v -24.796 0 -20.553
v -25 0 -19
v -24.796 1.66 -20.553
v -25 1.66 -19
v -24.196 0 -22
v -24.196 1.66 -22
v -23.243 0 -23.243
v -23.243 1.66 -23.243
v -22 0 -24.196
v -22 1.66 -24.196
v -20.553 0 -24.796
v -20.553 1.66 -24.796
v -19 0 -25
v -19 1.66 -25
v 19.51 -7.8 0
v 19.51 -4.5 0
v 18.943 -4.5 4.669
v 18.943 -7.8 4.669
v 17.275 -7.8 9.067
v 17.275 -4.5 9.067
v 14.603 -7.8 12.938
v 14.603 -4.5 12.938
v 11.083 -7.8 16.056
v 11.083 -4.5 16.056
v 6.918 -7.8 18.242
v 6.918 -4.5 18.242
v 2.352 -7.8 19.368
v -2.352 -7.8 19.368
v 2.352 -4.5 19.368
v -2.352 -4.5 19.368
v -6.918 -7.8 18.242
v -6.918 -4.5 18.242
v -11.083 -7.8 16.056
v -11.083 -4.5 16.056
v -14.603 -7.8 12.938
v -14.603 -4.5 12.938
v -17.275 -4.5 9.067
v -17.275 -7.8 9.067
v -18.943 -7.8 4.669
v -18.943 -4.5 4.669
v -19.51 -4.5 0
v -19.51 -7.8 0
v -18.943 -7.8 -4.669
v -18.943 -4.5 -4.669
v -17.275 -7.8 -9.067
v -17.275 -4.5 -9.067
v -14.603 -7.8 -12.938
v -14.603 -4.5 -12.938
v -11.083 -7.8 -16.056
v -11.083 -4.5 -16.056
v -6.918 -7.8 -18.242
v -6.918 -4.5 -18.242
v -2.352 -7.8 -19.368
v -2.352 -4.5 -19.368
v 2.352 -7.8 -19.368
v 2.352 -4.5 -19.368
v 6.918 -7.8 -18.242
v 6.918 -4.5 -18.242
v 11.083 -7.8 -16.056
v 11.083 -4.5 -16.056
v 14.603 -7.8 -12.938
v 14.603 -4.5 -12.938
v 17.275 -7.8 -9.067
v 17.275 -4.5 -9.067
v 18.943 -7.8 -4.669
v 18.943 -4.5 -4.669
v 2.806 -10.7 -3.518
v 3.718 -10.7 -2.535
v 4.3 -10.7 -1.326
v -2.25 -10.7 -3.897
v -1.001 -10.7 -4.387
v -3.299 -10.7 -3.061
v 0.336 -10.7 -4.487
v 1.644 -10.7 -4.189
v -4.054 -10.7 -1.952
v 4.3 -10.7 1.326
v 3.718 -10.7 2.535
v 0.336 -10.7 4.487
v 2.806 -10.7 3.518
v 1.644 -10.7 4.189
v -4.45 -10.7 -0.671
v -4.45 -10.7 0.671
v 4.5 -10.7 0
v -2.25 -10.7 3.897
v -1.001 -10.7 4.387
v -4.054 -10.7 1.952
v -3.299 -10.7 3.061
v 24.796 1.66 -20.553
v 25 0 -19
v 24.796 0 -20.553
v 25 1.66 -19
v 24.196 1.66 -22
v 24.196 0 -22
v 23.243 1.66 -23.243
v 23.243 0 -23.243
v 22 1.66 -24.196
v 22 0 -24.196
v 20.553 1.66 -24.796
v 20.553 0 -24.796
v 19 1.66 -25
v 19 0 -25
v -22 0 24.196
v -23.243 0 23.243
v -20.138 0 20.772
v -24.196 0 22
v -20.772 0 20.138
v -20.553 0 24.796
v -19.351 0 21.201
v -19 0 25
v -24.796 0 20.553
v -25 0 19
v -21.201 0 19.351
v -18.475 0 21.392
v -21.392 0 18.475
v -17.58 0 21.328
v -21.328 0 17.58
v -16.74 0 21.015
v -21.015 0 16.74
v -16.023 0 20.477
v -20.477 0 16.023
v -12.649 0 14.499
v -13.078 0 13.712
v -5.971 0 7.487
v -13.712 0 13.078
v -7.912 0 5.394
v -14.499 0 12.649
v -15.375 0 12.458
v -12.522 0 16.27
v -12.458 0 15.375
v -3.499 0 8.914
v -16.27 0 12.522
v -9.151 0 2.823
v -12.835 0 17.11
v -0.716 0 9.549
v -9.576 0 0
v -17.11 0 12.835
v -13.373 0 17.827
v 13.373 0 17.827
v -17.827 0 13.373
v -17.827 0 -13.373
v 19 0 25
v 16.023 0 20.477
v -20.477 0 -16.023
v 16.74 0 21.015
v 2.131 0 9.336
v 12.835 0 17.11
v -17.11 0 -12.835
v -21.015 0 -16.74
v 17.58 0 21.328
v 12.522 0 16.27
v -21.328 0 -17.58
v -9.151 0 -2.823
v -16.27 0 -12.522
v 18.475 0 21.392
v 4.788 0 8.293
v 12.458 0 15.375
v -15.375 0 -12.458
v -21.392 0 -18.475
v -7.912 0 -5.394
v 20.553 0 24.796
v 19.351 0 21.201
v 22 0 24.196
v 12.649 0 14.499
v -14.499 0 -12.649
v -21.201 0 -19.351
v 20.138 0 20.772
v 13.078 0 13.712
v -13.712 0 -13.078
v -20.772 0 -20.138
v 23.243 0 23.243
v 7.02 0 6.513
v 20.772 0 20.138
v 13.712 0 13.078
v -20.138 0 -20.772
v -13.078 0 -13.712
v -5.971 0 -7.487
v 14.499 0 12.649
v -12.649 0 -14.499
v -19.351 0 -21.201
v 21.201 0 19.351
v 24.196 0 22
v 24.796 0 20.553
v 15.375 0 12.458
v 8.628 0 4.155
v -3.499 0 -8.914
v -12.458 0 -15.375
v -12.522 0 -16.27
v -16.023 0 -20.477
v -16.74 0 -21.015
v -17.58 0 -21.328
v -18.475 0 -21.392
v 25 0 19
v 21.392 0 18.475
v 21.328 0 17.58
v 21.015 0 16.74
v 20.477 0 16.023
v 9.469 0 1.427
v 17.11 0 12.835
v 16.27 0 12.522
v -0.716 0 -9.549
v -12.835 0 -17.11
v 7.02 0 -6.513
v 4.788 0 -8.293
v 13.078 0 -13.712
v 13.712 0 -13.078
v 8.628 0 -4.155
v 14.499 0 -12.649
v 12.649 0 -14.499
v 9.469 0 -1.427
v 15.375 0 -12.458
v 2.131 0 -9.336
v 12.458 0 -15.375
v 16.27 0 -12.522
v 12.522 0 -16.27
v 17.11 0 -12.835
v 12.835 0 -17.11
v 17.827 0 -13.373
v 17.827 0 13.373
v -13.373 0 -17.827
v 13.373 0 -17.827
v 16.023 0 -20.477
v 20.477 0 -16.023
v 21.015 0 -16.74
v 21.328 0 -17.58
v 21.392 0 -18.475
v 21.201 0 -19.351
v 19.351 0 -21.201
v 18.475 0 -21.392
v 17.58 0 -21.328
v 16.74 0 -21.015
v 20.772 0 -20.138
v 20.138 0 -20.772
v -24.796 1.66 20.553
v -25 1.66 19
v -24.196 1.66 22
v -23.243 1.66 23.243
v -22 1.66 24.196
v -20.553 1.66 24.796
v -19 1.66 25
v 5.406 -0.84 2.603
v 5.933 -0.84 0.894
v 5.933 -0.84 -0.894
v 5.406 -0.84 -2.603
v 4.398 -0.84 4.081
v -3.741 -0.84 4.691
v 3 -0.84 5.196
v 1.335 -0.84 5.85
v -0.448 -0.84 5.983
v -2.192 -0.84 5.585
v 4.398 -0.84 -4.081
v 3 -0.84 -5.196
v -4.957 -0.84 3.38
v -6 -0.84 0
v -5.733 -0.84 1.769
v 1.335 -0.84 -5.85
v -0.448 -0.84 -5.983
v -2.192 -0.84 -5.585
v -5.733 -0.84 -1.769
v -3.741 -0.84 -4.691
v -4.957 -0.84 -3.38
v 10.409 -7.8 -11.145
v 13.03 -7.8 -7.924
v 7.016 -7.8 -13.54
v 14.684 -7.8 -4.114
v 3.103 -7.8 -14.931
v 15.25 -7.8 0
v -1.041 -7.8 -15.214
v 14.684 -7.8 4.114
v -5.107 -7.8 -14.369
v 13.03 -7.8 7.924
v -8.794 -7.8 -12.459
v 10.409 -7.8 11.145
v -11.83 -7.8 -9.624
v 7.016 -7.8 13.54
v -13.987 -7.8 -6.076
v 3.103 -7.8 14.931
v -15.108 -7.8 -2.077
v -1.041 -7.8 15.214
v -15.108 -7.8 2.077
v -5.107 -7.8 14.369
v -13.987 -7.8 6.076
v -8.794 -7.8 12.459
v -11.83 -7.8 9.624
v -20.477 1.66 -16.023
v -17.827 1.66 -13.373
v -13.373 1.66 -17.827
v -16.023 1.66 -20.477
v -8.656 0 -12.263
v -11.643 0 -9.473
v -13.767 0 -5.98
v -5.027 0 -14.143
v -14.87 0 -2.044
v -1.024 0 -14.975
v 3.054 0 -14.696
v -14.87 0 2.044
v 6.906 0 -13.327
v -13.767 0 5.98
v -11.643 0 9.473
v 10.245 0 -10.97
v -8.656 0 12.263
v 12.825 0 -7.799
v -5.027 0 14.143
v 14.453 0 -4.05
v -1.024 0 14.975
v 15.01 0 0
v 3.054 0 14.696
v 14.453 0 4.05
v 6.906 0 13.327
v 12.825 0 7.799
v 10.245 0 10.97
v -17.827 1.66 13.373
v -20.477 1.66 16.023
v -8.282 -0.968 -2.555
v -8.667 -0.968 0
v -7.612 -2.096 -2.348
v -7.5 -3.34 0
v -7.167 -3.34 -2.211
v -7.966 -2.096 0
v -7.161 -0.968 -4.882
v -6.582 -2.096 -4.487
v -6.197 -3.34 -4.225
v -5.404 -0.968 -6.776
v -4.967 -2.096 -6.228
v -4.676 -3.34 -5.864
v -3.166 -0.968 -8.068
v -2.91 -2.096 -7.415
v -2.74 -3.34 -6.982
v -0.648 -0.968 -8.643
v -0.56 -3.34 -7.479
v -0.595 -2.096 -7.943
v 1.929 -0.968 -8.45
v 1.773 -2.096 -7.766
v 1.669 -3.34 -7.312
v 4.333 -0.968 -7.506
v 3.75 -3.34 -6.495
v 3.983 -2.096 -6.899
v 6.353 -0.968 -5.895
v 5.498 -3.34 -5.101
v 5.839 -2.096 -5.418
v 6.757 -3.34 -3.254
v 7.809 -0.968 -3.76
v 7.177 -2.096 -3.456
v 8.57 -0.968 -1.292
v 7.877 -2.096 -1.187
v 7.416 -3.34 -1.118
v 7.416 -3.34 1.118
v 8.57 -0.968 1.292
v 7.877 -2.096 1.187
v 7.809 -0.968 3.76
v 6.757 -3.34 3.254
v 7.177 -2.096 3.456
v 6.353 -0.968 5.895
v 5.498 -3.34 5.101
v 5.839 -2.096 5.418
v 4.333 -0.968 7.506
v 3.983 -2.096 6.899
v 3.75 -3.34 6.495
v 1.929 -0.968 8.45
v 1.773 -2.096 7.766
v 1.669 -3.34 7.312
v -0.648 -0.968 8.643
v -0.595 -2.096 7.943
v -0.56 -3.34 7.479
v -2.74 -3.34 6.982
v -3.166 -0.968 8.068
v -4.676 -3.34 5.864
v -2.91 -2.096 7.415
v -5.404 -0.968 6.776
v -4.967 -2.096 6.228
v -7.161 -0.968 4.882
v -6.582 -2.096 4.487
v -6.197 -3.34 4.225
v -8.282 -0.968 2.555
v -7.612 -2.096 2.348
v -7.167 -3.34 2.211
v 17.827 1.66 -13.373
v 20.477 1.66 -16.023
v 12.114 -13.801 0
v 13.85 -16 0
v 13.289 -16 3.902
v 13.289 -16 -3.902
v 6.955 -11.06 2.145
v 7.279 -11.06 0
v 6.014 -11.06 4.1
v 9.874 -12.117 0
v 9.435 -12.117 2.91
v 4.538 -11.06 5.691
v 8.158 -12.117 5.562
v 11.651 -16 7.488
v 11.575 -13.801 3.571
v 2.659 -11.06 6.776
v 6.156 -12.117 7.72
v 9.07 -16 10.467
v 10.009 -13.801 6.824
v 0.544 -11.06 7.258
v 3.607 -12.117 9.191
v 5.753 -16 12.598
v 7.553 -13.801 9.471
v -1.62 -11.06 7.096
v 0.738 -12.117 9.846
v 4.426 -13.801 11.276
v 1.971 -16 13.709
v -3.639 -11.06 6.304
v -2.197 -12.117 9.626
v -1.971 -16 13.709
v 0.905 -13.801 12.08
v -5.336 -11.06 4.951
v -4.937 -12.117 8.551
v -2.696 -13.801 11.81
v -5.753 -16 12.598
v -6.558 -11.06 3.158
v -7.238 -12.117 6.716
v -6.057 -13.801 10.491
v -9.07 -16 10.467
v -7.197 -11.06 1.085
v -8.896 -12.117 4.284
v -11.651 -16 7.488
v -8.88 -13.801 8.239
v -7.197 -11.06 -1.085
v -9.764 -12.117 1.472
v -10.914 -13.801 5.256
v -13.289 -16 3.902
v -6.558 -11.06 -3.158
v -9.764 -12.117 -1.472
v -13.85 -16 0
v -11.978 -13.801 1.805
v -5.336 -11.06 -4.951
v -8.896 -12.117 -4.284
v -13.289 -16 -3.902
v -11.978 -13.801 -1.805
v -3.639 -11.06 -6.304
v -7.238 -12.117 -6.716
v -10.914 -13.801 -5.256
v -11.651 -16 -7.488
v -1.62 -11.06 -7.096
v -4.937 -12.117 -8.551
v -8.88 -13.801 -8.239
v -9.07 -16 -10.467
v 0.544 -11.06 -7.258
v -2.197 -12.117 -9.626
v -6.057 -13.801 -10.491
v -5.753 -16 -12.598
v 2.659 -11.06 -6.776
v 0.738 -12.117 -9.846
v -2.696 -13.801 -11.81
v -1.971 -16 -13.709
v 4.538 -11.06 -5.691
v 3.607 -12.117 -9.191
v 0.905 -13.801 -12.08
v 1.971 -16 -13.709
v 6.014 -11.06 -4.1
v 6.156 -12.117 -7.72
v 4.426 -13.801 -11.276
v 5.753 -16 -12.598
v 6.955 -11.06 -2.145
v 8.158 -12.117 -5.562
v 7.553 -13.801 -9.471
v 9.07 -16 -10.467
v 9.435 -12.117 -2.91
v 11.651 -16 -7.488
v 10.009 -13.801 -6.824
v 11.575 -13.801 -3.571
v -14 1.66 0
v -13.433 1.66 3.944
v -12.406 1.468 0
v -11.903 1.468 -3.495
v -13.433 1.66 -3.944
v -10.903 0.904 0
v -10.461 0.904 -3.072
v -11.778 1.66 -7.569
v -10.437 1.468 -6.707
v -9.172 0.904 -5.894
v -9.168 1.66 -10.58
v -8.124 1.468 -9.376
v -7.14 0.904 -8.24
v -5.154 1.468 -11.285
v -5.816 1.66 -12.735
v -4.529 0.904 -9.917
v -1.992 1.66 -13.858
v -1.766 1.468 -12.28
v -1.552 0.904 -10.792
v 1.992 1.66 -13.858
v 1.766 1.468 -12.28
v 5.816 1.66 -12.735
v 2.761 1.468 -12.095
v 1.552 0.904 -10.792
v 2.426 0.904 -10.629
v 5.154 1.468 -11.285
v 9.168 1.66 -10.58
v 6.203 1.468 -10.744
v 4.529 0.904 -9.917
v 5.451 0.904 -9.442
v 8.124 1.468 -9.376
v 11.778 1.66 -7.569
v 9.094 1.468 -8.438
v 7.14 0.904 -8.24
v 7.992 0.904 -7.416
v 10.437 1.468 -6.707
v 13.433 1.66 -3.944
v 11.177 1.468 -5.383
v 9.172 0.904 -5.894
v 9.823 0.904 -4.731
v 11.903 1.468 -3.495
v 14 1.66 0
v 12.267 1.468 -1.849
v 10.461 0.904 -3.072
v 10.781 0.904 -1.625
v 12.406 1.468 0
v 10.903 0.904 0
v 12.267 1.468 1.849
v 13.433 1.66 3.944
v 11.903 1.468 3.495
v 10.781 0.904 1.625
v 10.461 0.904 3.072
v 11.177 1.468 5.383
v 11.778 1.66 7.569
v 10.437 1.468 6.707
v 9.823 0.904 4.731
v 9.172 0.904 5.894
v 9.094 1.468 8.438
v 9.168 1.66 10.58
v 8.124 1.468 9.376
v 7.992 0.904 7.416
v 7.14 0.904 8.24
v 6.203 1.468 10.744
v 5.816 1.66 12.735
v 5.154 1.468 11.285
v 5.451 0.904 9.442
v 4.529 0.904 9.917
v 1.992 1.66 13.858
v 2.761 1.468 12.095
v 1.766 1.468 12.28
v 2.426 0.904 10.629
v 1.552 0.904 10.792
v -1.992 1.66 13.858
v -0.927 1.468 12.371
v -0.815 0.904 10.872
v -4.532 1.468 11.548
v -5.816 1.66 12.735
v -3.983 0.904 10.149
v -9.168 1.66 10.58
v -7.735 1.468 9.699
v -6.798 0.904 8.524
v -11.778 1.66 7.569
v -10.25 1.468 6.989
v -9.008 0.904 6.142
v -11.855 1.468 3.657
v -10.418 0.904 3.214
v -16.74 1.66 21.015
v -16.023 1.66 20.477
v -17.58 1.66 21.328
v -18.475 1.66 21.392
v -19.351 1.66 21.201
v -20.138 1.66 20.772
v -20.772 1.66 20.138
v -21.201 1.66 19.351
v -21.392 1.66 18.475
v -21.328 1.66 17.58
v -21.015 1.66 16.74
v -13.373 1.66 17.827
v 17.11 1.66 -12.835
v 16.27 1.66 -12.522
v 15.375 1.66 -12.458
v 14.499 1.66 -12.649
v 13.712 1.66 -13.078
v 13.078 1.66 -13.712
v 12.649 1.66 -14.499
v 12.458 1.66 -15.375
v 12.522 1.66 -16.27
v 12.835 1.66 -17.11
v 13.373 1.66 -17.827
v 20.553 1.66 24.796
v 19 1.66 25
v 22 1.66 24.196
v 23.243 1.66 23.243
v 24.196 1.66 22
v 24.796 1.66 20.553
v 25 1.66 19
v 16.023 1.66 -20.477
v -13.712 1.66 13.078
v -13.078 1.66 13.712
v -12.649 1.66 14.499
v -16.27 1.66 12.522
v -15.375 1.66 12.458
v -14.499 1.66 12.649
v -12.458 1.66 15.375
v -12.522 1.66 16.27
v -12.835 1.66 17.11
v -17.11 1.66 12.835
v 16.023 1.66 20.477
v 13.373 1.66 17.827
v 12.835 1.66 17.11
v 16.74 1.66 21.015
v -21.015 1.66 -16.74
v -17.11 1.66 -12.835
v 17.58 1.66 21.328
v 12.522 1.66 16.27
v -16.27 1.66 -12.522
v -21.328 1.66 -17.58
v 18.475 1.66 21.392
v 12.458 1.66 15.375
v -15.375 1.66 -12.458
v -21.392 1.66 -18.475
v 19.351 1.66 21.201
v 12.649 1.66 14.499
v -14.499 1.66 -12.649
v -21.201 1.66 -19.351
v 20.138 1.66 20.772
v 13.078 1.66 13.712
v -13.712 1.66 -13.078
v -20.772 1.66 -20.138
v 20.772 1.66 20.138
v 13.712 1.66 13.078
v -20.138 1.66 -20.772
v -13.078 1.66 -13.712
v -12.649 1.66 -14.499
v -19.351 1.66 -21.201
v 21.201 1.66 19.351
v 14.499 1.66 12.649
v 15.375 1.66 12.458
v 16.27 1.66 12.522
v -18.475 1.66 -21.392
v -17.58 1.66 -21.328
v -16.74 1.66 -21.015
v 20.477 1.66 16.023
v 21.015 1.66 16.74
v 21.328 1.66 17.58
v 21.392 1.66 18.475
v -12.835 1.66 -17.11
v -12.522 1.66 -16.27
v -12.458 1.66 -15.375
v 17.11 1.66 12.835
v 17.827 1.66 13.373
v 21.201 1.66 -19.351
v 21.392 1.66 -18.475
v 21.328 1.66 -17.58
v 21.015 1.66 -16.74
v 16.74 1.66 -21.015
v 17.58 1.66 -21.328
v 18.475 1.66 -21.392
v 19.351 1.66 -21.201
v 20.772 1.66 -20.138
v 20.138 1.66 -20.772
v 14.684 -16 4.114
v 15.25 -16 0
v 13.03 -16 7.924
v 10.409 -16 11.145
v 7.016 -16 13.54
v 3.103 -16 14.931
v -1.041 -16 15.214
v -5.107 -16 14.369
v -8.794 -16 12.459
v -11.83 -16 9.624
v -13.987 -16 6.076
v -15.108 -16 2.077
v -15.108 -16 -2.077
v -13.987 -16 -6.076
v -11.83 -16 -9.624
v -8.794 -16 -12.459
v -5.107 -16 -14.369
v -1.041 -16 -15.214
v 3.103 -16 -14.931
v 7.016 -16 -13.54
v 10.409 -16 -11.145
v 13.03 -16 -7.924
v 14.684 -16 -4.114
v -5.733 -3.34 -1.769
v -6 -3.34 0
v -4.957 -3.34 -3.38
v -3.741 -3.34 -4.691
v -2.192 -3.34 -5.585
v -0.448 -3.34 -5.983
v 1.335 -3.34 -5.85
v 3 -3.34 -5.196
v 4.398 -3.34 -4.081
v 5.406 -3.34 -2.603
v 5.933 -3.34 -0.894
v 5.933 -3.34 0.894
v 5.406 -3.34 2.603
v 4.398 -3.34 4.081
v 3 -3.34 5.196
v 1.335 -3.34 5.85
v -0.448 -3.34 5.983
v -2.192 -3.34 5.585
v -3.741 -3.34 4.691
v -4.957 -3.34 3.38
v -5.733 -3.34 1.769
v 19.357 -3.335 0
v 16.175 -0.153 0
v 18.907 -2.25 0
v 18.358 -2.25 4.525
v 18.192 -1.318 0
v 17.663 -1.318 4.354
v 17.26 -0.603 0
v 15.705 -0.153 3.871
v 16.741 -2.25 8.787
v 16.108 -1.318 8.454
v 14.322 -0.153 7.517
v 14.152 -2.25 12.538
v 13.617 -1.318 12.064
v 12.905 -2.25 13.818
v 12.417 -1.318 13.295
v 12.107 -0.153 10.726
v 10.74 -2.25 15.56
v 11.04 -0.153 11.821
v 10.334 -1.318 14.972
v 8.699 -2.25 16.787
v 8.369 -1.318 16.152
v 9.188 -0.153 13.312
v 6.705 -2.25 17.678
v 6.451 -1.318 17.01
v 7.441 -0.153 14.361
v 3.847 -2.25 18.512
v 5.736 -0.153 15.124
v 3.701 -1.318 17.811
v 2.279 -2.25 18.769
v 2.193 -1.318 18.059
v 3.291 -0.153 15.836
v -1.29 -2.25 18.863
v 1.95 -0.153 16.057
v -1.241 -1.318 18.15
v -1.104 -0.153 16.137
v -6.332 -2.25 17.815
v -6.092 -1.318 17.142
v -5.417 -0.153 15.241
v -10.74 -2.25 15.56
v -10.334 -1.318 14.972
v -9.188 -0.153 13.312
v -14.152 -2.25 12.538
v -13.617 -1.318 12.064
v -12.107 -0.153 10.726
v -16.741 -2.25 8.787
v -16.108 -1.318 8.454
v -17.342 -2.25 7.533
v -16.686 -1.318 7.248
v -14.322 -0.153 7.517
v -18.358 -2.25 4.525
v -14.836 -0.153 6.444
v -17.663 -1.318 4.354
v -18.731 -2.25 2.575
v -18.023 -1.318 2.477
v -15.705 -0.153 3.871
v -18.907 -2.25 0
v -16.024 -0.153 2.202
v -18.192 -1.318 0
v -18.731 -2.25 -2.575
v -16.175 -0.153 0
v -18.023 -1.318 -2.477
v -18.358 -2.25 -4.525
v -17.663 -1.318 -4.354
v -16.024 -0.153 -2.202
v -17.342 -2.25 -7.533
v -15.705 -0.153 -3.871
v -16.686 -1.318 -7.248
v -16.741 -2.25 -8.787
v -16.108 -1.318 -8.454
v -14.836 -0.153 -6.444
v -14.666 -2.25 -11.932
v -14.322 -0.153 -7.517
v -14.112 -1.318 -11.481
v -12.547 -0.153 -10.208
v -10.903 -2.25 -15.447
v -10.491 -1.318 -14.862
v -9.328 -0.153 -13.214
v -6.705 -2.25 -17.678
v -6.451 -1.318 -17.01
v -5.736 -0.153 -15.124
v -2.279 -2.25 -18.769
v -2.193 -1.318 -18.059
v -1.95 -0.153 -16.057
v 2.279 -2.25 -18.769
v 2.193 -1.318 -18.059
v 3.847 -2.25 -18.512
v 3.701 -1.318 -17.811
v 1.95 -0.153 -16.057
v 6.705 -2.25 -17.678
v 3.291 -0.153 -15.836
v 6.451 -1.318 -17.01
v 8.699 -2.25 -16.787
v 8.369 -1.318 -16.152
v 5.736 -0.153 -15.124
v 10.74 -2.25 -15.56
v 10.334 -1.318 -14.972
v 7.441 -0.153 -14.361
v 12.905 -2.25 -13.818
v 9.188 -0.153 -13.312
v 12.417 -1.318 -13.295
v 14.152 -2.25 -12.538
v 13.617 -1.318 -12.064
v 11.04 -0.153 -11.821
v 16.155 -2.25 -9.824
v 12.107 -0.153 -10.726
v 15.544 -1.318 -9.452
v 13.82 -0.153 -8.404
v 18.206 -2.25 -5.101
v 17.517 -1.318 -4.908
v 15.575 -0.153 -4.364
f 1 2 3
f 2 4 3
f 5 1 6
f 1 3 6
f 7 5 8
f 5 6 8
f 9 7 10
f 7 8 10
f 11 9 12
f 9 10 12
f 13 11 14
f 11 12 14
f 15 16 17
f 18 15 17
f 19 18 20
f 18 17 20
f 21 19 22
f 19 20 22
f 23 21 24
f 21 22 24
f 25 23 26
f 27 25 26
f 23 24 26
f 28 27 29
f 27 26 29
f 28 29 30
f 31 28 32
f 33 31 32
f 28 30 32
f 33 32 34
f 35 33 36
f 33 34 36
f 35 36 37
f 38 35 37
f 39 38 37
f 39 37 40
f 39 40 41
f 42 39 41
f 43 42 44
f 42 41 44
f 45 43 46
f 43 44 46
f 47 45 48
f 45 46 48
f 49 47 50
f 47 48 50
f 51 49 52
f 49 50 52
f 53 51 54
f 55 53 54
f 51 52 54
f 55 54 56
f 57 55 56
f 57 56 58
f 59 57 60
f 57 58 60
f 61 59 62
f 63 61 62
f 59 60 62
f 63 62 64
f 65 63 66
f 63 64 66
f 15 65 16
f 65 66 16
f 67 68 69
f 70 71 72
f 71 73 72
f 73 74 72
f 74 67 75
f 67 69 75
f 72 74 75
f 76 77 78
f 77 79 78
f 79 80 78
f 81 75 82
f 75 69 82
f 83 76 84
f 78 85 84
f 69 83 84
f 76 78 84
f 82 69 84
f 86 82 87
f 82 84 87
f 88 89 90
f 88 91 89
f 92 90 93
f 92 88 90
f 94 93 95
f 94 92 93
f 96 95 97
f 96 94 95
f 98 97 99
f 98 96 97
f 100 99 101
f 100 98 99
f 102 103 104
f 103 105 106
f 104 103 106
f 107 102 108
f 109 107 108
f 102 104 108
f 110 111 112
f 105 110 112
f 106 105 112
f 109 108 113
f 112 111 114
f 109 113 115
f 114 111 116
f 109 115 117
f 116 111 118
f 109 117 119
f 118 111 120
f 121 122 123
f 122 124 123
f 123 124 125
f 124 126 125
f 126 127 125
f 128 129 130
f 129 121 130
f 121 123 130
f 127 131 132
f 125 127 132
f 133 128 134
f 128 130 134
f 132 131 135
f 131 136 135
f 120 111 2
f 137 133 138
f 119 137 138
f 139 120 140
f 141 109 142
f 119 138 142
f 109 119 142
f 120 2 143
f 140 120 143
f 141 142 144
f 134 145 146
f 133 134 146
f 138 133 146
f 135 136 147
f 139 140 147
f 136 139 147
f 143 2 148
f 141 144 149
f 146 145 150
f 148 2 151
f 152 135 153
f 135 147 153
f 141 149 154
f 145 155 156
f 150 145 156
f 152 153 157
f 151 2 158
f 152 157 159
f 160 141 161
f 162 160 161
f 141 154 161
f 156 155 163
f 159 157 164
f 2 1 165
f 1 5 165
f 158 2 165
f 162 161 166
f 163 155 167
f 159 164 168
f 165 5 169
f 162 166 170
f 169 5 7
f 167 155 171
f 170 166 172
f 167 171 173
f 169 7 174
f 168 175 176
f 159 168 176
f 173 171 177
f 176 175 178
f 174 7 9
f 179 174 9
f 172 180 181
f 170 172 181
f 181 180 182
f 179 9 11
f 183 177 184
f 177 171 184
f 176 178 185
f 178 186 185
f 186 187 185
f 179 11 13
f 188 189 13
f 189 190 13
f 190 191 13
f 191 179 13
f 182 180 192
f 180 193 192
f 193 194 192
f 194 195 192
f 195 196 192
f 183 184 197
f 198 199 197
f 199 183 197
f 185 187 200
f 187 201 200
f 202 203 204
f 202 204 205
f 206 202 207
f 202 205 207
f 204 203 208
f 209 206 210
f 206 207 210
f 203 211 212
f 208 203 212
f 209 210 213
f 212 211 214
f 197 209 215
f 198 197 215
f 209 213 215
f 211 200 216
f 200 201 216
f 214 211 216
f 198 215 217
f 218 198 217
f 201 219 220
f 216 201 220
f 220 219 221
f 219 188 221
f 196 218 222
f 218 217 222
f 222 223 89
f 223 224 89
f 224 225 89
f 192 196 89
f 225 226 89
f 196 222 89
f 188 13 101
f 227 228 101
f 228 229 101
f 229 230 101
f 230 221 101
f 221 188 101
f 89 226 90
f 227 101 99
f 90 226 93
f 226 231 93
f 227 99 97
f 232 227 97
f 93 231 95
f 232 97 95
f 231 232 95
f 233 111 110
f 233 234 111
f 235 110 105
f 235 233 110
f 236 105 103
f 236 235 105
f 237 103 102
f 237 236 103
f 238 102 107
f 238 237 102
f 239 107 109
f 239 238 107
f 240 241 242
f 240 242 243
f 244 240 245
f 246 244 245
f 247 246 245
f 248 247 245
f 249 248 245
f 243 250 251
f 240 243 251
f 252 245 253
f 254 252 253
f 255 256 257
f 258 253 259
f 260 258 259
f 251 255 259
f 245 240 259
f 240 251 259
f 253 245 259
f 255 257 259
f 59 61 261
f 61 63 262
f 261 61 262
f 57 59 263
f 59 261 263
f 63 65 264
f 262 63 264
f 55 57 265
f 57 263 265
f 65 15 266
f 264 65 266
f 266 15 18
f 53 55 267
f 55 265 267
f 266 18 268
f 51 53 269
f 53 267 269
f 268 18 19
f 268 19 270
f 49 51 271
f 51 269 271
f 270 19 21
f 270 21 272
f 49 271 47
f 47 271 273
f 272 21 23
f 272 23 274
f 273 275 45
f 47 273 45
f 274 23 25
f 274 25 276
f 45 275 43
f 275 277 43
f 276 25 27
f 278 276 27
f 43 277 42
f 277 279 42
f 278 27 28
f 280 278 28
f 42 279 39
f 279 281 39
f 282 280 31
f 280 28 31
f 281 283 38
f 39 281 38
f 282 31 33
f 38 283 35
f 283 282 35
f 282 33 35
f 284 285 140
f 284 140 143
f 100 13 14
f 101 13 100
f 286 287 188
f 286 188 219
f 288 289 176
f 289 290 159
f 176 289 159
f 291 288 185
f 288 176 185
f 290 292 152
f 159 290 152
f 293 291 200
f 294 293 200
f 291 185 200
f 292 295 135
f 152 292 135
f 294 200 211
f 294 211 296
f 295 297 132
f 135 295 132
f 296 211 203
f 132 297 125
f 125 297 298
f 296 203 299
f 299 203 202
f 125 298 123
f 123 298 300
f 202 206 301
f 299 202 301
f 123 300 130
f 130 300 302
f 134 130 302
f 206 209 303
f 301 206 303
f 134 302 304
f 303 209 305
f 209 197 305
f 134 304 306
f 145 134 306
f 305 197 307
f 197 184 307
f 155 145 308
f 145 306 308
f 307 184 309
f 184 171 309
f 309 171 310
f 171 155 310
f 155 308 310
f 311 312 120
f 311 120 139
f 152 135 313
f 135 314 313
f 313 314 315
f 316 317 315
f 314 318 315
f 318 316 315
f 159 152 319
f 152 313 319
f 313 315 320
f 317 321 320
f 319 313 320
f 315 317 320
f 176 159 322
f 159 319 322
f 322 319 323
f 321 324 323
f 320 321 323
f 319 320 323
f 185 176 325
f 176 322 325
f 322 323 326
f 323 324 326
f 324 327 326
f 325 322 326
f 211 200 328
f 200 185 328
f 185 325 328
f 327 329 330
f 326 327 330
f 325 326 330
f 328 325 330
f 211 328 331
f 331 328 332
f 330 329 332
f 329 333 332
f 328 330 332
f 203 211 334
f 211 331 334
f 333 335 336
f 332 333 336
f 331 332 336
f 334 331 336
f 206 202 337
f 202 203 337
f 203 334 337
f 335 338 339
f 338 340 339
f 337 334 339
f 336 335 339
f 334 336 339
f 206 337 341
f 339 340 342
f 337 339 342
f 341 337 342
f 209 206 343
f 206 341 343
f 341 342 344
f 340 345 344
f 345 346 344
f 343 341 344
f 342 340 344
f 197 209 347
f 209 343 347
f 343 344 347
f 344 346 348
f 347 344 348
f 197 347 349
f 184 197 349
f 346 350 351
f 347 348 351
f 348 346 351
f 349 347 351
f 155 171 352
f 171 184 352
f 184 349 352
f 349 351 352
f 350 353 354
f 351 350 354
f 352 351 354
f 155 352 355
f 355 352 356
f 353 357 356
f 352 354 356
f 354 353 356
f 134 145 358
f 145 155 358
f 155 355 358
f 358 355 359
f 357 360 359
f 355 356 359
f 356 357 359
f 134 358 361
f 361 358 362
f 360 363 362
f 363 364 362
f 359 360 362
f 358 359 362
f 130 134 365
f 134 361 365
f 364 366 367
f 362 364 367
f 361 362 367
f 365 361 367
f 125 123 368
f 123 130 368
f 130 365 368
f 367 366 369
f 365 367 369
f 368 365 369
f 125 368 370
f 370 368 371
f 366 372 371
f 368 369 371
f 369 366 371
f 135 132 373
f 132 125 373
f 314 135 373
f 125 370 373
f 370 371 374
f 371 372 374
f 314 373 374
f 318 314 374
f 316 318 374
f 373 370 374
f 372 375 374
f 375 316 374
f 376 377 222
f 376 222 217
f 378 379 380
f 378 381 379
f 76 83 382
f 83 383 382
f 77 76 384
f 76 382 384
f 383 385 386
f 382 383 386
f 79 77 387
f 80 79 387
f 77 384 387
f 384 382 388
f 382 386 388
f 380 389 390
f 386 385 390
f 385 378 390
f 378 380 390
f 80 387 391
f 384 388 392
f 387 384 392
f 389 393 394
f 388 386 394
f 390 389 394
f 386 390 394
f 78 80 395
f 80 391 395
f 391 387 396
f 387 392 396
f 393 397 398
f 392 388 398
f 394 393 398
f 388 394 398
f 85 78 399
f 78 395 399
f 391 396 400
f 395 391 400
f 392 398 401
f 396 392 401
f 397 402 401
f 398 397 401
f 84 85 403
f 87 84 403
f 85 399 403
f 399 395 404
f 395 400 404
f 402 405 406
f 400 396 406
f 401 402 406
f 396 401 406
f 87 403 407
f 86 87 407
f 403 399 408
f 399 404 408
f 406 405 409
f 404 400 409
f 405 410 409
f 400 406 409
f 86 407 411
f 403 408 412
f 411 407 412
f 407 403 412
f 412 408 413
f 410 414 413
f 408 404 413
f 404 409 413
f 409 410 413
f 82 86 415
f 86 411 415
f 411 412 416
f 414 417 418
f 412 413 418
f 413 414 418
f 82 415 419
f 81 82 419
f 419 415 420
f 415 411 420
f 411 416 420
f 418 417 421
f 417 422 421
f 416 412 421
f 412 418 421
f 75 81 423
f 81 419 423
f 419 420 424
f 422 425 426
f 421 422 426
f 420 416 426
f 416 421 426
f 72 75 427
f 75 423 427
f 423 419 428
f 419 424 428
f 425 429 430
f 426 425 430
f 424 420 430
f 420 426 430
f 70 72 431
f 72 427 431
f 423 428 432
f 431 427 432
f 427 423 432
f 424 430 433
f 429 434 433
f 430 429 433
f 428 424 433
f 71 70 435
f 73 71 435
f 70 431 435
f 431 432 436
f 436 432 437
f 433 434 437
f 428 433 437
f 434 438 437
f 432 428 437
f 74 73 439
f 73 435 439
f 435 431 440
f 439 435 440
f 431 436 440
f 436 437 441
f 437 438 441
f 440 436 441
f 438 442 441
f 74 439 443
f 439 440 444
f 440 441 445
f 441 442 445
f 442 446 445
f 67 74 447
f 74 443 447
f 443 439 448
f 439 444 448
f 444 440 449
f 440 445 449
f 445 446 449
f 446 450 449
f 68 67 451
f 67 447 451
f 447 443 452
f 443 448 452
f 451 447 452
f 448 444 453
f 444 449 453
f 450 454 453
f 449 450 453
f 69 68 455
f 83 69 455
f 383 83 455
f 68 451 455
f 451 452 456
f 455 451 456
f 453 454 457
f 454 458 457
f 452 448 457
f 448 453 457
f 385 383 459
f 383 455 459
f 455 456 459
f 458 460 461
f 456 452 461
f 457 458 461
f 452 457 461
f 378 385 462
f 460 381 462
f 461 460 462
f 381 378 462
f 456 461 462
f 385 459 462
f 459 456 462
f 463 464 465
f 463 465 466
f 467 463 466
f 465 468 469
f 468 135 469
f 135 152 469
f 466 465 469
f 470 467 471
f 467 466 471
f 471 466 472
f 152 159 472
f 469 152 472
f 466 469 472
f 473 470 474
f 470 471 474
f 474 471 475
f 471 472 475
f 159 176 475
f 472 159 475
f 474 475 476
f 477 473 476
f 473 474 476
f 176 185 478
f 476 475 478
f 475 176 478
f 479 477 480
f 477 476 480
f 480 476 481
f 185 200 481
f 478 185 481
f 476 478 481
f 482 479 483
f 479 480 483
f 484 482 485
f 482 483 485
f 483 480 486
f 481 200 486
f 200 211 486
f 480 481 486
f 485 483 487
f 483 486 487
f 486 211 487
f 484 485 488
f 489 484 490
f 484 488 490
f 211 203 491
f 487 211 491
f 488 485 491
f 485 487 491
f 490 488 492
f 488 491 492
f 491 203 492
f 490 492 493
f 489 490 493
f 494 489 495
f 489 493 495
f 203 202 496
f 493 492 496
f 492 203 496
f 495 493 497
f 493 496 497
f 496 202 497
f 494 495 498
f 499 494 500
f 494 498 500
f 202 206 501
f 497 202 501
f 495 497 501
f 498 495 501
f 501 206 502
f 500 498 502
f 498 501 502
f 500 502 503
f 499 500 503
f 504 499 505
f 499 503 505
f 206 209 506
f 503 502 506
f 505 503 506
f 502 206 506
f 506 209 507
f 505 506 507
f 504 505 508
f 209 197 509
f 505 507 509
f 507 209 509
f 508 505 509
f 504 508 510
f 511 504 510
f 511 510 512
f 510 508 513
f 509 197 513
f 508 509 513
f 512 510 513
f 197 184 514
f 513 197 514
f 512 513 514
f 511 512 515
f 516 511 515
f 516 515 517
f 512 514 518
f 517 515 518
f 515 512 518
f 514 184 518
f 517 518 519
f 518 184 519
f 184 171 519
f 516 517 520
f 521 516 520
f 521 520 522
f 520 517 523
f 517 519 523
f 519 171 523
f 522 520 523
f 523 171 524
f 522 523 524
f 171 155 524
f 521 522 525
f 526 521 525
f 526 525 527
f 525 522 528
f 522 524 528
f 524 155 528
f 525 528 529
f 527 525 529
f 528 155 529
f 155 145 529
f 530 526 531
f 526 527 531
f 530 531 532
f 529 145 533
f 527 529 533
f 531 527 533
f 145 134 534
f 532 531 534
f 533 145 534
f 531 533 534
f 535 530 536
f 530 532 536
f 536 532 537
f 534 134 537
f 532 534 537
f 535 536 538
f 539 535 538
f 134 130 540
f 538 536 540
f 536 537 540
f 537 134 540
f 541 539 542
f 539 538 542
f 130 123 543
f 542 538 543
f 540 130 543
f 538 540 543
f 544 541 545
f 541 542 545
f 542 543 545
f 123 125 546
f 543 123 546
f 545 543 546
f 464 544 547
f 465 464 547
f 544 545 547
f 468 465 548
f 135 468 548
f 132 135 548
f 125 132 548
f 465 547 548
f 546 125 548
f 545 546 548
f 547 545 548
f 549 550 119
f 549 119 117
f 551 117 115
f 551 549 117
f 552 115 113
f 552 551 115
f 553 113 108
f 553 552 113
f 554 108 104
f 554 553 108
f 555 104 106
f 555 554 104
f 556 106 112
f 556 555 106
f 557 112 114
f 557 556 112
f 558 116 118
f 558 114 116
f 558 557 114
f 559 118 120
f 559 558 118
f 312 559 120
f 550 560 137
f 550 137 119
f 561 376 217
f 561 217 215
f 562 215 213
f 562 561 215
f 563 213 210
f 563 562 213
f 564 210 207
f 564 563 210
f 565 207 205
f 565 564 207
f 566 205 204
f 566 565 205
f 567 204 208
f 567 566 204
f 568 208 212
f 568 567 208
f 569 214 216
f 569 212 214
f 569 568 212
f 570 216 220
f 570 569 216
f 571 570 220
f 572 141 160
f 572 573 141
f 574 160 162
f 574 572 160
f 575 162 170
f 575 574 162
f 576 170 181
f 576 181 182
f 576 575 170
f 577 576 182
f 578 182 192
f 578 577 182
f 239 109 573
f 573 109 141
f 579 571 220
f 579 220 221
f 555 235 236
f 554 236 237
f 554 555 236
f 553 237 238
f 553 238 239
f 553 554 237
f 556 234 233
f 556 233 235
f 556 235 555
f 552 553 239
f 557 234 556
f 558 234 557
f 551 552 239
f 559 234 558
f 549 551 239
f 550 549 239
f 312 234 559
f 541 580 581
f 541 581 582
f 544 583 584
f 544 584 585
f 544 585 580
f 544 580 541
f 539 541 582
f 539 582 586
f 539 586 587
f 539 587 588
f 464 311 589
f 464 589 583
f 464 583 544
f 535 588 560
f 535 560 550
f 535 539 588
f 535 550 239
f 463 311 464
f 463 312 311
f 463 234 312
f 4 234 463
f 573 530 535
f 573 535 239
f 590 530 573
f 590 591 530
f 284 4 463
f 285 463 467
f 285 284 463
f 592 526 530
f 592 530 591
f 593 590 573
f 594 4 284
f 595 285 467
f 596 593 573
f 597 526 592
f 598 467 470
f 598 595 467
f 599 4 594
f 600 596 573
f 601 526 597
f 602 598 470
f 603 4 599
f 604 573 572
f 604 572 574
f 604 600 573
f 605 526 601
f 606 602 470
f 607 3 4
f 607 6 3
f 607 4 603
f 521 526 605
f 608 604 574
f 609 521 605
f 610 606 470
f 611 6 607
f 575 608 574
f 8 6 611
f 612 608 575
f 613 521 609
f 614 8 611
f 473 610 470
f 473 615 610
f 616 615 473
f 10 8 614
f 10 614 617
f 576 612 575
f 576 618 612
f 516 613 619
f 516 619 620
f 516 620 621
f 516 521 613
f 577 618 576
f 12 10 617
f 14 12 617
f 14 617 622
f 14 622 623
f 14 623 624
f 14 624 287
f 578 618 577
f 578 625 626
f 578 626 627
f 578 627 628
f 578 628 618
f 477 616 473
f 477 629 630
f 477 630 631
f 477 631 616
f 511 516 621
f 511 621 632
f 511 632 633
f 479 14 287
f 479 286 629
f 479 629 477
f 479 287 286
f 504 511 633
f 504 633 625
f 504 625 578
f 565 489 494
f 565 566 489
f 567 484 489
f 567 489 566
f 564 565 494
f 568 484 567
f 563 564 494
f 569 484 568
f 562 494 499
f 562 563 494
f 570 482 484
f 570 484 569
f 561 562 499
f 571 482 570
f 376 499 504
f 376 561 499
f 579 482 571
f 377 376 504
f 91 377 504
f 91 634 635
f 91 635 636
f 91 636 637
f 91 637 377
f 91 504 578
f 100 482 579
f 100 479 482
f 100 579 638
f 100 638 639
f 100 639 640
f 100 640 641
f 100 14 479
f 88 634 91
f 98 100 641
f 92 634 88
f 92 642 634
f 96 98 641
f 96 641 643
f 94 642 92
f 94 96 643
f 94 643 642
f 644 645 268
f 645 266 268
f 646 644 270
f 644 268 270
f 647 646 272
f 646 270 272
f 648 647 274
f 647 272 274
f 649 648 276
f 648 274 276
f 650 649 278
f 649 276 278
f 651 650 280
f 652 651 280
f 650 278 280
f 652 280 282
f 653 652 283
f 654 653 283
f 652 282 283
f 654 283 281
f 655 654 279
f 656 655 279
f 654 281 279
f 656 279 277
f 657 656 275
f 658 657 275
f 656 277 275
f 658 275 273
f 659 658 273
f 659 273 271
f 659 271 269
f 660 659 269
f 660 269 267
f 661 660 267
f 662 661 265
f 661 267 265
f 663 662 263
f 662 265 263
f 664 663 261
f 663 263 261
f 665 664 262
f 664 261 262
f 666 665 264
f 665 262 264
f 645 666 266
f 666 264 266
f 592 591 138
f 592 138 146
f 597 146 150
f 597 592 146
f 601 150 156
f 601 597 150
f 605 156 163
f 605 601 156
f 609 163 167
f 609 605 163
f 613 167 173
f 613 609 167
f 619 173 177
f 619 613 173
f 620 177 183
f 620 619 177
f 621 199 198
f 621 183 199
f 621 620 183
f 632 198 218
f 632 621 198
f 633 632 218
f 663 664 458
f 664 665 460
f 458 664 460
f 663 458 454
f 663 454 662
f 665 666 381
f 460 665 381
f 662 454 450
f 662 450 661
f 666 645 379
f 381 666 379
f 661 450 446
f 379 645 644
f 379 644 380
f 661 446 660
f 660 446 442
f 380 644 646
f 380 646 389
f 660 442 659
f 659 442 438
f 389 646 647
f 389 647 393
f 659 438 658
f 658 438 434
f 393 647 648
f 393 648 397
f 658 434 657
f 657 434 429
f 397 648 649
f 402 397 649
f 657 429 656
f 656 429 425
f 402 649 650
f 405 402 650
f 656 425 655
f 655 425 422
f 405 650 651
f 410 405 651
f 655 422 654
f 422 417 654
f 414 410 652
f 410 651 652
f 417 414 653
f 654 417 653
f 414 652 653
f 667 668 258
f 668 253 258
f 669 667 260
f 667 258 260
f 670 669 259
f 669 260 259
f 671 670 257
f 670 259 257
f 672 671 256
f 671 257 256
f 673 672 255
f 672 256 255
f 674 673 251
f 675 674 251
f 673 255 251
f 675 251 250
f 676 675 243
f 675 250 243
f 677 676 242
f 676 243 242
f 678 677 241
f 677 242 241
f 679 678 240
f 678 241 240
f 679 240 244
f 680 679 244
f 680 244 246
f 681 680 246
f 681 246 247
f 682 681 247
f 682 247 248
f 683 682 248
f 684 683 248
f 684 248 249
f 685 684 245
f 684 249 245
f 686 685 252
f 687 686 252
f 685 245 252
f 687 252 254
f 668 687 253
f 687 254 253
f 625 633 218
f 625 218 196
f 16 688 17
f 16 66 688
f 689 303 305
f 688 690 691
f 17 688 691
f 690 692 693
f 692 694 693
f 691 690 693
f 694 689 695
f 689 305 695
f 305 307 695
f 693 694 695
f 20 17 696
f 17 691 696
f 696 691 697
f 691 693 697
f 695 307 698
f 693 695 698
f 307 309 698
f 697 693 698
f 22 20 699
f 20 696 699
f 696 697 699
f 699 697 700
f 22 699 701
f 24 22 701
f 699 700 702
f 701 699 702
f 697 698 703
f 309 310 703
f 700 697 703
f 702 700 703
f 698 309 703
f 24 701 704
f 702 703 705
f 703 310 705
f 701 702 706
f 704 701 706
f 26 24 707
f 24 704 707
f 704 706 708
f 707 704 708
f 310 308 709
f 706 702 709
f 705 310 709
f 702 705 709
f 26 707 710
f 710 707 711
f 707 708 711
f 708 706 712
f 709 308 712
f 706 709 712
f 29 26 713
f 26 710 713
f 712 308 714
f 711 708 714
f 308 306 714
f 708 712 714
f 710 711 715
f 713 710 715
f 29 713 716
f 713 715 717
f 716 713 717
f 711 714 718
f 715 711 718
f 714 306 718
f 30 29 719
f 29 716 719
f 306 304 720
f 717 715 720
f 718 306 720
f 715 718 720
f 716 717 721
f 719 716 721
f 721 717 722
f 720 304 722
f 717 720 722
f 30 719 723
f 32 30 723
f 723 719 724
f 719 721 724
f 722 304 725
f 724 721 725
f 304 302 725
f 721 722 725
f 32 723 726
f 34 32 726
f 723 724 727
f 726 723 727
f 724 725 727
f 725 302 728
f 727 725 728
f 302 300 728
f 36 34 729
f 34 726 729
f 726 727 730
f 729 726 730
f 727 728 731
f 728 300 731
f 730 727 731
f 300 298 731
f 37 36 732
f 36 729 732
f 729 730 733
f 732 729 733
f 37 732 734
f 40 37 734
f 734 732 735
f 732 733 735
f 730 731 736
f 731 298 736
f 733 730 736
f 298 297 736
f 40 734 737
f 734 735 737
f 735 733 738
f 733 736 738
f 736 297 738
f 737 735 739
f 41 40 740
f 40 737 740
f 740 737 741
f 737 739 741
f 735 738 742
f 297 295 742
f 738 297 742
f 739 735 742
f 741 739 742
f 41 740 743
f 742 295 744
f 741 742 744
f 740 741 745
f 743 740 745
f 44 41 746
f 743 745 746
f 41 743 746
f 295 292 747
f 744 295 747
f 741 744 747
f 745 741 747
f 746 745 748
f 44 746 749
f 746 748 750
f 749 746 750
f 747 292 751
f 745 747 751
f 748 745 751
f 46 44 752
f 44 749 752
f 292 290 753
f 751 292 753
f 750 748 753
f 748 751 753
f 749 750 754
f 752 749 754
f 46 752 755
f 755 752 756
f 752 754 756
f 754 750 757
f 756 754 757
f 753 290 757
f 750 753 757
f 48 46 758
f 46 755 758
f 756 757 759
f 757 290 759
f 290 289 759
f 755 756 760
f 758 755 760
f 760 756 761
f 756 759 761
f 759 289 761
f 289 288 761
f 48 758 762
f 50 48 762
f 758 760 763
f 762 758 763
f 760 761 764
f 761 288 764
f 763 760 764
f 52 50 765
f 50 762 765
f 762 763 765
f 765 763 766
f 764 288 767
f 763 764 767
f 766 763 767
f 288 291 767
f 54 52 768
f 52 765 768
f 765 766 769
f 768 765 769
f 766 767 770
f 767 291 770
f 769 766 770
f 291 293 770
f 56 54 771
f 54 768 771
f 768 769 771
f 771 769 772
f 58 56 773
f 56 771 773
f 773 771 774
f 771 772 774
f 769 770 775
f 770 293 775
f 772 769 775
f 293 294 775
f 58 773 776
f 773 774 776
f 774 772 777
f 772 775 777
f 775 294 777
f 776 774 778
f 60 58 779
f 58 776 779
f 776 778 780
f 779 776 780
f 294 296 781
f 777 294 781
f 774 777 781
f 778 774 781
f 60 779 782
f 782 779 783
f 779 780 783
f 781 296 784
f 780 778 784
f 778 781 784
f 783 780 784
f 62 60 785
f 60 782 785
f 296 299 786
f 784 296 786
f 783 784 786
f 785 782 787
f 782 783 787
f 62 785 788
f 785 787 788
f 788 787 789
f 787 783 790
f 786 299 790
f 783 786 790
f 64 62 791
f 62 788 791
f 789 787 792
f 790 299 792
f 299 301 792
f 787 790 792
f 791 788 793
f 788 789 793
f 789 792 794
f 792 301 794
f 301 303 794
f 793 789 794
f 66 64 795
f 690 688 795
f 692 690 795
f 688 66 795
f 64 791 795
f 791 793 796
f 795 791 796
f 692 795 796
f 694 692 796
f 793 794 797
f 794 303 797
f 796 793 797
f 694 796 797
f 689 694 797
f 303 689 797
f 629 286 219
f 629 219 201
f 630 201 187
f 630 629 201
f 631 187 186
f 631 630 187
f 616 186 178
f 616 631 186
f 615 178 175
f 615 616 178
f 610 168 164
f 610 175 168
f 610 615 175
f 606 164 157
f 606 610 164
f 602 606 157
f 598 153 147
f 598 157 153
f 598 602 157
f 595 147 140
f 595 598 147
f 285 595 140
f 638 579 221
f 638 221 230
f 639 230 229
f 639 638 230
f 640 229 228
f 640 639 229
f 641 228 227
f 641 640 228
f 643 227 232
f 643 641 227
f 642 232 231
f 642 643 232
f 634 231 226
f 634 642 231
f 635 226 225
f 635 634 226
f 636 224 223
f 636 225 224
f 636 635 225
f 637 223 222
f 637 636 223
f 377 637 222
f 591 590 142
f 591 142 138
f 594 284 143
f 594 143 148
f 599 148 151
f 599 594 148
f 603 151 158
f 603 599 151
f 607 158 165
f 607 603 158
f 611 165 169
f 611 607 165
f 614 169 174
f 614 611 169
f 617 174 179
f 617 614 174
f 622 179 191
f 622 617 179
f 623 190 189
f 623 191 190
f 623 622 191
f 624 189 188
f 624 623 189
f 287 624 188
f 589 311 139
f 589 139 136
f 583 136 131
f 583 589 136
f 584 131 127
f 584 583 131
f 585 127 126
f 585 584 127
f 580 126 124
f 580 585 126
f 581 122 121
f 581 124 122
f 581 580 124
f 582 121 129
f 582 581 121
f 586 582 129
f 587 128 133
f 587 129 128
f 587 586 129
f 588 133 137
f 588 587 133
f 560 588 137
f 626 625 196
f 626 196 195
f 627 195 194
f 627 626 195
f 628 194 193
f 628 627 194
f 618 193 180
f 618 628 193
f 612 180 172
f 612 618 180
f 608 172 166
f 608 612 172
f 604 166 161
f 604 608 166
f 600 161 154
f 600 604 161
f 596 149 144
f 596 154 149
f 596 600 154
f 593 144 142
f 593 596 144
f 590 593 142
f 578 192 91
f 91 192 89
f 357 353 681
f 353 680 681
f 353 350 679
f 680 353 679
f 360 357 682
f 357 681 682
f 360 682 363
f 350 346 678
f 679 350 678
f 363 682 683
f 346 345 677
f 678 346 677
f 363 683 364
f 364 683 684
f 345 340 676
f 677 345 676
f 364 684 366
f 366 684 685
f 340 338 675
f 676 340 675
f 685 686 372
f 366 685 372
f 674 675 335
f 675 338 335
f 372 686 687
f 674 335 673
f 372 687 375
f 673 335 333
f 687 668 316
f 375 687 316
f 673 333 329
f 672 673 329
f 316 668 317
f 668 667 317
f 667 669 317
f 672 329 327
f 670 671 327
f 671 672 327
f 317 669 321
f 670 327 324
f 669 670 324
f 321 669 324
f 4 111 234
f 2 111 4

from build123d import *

# Parameters (mm, degrees)
SKETCH1_W              = 50
SKETCH1_H              = 50
BOSS_PLATE_DEPTH       = 1.66
FILLET_PLATE_CORNERS_R = 6
CUT_SLOT_DEPTH         = 36.394287675
SLOT_PATTERN_COUNT     = 4
FILLET2_R              = 4.5


with BuildPart() as part:
    # Sketch1 → boss_plate (new body)
    with BuildSketch(Plane(origin=(0, 0, 0), x_dir=(1, 0, 0), z_dir=(0, 1, 0))):
        Rectangle(SKETCH1_W, SKETCH1_H)
    extrude(amount=BOSS_PLATE_DEPTH)

    # fillet plate corners
    fillet_plate_corners_edges = [part.edges().sort_by_distance(p)[0] for p in [
        (25, 0.83, 25),
        (-25, 0.83, -25),
        (25, 0.83, -25),
        (-25, 0.83, 25),
    ]]
    fillet(fillet_plate_corners_edges, radius=FILLET_PLATE_CORNERS_R)

    # Sketch2 → cut slot (cut, through all)
    with BuildSketch(Plane(origin=(0, 1.66, 0), x_dir=(1, 0, 0), z_dir=(0, 1, 0))):
        with BuildLine():
            Line((13.372613639, 17.827386361), (16.022613639, 20.477386361))
            ThreePointArc((16.022613639, 20.477386361), (20.477386361, 20.477386361), (20.477386361, 16.022613639))
            Line((20.477386361, 16.022613639), (17.827386361, 13.372613639))
            ThreePointArc((17.827386361, 13.372613639), (13.372613639, 13.372613639), (13.372613639, 17.827386361))
        make_face()
    cut_slot = extrude(amount=-CUT_SLOT_DEPTH, mode=Mode.SUBTRACT)

    # slot pattern: cut slot ×4 about axis
    slot_pattern_axis = Axis((0, -2.147420323, 0), (0, 1, 0))
    for i in range(1, SLOT_PATTERN_COUNT):
        add(cut_slot.rotate(slot_pattern_axis, i * 360 / SLOT_PATTERN_COUNT), mode=Mode.SUBTRACT)


with BuildPart() as body_2:
    # Sketch3 → bearing_upper_seat (revolve)
    with BuildSketch(Plane.XY):
        with BuildLine():
            Line((19.51, -7.8), (19.51, 0))
            Line((19.51, 0), (0, 0))
            Line((0, 0), (0, -10.7))
            Line((0, -10.7), (4.5, -10.7))
            ThreePointArc((4.5, -10.7), (9.873837084, -12.1171459), (13.85, -16))
            Line((13.85, -16), (15.25, -16))
            Line((15.25, -16), (15.25, -7.8))
            Line((15.25, -7.8), (19.51, -7.8))
        make_face()
    revolve(axis=Axis((0, 0, 0), (0, -1, 0)))


with BuildPart() as cut_plate_forming_tool:
    # Sketch4 → cut_plate_forming (revolve)
    with BuildSketch(Plane.XY):
        with BuildLine():
            Line((-6, -3.34), (-6, -0.84))
            Line((-6, -0.84), (0, -0.84))
            Line((0, -0.84), (0, 1.66))
            Line((0, 1.66), (-14, 1.66))
            ThreePointArc((-14, 1.66), (-9.899695133, 0.265396327), (-7.5, -3.34))
            Line((-7.5, -3.34), (-6, -3.34))
        make_face()
    revolve(axis=Axis((0, 1.66, 0), (0, -1, 0)))


with BuildPart() as part_1:
    add(part.part)

    # cut_plate_forming: cut by cut_plate_forming_tool
    add(cut_plate_forming_tool.part, mode=Mode.SUBTRACT)


with BuildPart() as body_2_1:
    add(body_2.part)

    # cut_plate_forming: cut by cut_plate_forming_tool
    add(cut_plate_forming_tool.part, mode=Mode.SUBTRACT)

    # Fillet2
    fillet2_edges = [body_2_1.edges().sort_by_distance(p)[0] for p in [
        (-19.51, 0, 0),
    ]]
    fillet(fillet2_edges, radius=FILLET2_R)


solid = Compound([part_1.part, body_2_1.part])
